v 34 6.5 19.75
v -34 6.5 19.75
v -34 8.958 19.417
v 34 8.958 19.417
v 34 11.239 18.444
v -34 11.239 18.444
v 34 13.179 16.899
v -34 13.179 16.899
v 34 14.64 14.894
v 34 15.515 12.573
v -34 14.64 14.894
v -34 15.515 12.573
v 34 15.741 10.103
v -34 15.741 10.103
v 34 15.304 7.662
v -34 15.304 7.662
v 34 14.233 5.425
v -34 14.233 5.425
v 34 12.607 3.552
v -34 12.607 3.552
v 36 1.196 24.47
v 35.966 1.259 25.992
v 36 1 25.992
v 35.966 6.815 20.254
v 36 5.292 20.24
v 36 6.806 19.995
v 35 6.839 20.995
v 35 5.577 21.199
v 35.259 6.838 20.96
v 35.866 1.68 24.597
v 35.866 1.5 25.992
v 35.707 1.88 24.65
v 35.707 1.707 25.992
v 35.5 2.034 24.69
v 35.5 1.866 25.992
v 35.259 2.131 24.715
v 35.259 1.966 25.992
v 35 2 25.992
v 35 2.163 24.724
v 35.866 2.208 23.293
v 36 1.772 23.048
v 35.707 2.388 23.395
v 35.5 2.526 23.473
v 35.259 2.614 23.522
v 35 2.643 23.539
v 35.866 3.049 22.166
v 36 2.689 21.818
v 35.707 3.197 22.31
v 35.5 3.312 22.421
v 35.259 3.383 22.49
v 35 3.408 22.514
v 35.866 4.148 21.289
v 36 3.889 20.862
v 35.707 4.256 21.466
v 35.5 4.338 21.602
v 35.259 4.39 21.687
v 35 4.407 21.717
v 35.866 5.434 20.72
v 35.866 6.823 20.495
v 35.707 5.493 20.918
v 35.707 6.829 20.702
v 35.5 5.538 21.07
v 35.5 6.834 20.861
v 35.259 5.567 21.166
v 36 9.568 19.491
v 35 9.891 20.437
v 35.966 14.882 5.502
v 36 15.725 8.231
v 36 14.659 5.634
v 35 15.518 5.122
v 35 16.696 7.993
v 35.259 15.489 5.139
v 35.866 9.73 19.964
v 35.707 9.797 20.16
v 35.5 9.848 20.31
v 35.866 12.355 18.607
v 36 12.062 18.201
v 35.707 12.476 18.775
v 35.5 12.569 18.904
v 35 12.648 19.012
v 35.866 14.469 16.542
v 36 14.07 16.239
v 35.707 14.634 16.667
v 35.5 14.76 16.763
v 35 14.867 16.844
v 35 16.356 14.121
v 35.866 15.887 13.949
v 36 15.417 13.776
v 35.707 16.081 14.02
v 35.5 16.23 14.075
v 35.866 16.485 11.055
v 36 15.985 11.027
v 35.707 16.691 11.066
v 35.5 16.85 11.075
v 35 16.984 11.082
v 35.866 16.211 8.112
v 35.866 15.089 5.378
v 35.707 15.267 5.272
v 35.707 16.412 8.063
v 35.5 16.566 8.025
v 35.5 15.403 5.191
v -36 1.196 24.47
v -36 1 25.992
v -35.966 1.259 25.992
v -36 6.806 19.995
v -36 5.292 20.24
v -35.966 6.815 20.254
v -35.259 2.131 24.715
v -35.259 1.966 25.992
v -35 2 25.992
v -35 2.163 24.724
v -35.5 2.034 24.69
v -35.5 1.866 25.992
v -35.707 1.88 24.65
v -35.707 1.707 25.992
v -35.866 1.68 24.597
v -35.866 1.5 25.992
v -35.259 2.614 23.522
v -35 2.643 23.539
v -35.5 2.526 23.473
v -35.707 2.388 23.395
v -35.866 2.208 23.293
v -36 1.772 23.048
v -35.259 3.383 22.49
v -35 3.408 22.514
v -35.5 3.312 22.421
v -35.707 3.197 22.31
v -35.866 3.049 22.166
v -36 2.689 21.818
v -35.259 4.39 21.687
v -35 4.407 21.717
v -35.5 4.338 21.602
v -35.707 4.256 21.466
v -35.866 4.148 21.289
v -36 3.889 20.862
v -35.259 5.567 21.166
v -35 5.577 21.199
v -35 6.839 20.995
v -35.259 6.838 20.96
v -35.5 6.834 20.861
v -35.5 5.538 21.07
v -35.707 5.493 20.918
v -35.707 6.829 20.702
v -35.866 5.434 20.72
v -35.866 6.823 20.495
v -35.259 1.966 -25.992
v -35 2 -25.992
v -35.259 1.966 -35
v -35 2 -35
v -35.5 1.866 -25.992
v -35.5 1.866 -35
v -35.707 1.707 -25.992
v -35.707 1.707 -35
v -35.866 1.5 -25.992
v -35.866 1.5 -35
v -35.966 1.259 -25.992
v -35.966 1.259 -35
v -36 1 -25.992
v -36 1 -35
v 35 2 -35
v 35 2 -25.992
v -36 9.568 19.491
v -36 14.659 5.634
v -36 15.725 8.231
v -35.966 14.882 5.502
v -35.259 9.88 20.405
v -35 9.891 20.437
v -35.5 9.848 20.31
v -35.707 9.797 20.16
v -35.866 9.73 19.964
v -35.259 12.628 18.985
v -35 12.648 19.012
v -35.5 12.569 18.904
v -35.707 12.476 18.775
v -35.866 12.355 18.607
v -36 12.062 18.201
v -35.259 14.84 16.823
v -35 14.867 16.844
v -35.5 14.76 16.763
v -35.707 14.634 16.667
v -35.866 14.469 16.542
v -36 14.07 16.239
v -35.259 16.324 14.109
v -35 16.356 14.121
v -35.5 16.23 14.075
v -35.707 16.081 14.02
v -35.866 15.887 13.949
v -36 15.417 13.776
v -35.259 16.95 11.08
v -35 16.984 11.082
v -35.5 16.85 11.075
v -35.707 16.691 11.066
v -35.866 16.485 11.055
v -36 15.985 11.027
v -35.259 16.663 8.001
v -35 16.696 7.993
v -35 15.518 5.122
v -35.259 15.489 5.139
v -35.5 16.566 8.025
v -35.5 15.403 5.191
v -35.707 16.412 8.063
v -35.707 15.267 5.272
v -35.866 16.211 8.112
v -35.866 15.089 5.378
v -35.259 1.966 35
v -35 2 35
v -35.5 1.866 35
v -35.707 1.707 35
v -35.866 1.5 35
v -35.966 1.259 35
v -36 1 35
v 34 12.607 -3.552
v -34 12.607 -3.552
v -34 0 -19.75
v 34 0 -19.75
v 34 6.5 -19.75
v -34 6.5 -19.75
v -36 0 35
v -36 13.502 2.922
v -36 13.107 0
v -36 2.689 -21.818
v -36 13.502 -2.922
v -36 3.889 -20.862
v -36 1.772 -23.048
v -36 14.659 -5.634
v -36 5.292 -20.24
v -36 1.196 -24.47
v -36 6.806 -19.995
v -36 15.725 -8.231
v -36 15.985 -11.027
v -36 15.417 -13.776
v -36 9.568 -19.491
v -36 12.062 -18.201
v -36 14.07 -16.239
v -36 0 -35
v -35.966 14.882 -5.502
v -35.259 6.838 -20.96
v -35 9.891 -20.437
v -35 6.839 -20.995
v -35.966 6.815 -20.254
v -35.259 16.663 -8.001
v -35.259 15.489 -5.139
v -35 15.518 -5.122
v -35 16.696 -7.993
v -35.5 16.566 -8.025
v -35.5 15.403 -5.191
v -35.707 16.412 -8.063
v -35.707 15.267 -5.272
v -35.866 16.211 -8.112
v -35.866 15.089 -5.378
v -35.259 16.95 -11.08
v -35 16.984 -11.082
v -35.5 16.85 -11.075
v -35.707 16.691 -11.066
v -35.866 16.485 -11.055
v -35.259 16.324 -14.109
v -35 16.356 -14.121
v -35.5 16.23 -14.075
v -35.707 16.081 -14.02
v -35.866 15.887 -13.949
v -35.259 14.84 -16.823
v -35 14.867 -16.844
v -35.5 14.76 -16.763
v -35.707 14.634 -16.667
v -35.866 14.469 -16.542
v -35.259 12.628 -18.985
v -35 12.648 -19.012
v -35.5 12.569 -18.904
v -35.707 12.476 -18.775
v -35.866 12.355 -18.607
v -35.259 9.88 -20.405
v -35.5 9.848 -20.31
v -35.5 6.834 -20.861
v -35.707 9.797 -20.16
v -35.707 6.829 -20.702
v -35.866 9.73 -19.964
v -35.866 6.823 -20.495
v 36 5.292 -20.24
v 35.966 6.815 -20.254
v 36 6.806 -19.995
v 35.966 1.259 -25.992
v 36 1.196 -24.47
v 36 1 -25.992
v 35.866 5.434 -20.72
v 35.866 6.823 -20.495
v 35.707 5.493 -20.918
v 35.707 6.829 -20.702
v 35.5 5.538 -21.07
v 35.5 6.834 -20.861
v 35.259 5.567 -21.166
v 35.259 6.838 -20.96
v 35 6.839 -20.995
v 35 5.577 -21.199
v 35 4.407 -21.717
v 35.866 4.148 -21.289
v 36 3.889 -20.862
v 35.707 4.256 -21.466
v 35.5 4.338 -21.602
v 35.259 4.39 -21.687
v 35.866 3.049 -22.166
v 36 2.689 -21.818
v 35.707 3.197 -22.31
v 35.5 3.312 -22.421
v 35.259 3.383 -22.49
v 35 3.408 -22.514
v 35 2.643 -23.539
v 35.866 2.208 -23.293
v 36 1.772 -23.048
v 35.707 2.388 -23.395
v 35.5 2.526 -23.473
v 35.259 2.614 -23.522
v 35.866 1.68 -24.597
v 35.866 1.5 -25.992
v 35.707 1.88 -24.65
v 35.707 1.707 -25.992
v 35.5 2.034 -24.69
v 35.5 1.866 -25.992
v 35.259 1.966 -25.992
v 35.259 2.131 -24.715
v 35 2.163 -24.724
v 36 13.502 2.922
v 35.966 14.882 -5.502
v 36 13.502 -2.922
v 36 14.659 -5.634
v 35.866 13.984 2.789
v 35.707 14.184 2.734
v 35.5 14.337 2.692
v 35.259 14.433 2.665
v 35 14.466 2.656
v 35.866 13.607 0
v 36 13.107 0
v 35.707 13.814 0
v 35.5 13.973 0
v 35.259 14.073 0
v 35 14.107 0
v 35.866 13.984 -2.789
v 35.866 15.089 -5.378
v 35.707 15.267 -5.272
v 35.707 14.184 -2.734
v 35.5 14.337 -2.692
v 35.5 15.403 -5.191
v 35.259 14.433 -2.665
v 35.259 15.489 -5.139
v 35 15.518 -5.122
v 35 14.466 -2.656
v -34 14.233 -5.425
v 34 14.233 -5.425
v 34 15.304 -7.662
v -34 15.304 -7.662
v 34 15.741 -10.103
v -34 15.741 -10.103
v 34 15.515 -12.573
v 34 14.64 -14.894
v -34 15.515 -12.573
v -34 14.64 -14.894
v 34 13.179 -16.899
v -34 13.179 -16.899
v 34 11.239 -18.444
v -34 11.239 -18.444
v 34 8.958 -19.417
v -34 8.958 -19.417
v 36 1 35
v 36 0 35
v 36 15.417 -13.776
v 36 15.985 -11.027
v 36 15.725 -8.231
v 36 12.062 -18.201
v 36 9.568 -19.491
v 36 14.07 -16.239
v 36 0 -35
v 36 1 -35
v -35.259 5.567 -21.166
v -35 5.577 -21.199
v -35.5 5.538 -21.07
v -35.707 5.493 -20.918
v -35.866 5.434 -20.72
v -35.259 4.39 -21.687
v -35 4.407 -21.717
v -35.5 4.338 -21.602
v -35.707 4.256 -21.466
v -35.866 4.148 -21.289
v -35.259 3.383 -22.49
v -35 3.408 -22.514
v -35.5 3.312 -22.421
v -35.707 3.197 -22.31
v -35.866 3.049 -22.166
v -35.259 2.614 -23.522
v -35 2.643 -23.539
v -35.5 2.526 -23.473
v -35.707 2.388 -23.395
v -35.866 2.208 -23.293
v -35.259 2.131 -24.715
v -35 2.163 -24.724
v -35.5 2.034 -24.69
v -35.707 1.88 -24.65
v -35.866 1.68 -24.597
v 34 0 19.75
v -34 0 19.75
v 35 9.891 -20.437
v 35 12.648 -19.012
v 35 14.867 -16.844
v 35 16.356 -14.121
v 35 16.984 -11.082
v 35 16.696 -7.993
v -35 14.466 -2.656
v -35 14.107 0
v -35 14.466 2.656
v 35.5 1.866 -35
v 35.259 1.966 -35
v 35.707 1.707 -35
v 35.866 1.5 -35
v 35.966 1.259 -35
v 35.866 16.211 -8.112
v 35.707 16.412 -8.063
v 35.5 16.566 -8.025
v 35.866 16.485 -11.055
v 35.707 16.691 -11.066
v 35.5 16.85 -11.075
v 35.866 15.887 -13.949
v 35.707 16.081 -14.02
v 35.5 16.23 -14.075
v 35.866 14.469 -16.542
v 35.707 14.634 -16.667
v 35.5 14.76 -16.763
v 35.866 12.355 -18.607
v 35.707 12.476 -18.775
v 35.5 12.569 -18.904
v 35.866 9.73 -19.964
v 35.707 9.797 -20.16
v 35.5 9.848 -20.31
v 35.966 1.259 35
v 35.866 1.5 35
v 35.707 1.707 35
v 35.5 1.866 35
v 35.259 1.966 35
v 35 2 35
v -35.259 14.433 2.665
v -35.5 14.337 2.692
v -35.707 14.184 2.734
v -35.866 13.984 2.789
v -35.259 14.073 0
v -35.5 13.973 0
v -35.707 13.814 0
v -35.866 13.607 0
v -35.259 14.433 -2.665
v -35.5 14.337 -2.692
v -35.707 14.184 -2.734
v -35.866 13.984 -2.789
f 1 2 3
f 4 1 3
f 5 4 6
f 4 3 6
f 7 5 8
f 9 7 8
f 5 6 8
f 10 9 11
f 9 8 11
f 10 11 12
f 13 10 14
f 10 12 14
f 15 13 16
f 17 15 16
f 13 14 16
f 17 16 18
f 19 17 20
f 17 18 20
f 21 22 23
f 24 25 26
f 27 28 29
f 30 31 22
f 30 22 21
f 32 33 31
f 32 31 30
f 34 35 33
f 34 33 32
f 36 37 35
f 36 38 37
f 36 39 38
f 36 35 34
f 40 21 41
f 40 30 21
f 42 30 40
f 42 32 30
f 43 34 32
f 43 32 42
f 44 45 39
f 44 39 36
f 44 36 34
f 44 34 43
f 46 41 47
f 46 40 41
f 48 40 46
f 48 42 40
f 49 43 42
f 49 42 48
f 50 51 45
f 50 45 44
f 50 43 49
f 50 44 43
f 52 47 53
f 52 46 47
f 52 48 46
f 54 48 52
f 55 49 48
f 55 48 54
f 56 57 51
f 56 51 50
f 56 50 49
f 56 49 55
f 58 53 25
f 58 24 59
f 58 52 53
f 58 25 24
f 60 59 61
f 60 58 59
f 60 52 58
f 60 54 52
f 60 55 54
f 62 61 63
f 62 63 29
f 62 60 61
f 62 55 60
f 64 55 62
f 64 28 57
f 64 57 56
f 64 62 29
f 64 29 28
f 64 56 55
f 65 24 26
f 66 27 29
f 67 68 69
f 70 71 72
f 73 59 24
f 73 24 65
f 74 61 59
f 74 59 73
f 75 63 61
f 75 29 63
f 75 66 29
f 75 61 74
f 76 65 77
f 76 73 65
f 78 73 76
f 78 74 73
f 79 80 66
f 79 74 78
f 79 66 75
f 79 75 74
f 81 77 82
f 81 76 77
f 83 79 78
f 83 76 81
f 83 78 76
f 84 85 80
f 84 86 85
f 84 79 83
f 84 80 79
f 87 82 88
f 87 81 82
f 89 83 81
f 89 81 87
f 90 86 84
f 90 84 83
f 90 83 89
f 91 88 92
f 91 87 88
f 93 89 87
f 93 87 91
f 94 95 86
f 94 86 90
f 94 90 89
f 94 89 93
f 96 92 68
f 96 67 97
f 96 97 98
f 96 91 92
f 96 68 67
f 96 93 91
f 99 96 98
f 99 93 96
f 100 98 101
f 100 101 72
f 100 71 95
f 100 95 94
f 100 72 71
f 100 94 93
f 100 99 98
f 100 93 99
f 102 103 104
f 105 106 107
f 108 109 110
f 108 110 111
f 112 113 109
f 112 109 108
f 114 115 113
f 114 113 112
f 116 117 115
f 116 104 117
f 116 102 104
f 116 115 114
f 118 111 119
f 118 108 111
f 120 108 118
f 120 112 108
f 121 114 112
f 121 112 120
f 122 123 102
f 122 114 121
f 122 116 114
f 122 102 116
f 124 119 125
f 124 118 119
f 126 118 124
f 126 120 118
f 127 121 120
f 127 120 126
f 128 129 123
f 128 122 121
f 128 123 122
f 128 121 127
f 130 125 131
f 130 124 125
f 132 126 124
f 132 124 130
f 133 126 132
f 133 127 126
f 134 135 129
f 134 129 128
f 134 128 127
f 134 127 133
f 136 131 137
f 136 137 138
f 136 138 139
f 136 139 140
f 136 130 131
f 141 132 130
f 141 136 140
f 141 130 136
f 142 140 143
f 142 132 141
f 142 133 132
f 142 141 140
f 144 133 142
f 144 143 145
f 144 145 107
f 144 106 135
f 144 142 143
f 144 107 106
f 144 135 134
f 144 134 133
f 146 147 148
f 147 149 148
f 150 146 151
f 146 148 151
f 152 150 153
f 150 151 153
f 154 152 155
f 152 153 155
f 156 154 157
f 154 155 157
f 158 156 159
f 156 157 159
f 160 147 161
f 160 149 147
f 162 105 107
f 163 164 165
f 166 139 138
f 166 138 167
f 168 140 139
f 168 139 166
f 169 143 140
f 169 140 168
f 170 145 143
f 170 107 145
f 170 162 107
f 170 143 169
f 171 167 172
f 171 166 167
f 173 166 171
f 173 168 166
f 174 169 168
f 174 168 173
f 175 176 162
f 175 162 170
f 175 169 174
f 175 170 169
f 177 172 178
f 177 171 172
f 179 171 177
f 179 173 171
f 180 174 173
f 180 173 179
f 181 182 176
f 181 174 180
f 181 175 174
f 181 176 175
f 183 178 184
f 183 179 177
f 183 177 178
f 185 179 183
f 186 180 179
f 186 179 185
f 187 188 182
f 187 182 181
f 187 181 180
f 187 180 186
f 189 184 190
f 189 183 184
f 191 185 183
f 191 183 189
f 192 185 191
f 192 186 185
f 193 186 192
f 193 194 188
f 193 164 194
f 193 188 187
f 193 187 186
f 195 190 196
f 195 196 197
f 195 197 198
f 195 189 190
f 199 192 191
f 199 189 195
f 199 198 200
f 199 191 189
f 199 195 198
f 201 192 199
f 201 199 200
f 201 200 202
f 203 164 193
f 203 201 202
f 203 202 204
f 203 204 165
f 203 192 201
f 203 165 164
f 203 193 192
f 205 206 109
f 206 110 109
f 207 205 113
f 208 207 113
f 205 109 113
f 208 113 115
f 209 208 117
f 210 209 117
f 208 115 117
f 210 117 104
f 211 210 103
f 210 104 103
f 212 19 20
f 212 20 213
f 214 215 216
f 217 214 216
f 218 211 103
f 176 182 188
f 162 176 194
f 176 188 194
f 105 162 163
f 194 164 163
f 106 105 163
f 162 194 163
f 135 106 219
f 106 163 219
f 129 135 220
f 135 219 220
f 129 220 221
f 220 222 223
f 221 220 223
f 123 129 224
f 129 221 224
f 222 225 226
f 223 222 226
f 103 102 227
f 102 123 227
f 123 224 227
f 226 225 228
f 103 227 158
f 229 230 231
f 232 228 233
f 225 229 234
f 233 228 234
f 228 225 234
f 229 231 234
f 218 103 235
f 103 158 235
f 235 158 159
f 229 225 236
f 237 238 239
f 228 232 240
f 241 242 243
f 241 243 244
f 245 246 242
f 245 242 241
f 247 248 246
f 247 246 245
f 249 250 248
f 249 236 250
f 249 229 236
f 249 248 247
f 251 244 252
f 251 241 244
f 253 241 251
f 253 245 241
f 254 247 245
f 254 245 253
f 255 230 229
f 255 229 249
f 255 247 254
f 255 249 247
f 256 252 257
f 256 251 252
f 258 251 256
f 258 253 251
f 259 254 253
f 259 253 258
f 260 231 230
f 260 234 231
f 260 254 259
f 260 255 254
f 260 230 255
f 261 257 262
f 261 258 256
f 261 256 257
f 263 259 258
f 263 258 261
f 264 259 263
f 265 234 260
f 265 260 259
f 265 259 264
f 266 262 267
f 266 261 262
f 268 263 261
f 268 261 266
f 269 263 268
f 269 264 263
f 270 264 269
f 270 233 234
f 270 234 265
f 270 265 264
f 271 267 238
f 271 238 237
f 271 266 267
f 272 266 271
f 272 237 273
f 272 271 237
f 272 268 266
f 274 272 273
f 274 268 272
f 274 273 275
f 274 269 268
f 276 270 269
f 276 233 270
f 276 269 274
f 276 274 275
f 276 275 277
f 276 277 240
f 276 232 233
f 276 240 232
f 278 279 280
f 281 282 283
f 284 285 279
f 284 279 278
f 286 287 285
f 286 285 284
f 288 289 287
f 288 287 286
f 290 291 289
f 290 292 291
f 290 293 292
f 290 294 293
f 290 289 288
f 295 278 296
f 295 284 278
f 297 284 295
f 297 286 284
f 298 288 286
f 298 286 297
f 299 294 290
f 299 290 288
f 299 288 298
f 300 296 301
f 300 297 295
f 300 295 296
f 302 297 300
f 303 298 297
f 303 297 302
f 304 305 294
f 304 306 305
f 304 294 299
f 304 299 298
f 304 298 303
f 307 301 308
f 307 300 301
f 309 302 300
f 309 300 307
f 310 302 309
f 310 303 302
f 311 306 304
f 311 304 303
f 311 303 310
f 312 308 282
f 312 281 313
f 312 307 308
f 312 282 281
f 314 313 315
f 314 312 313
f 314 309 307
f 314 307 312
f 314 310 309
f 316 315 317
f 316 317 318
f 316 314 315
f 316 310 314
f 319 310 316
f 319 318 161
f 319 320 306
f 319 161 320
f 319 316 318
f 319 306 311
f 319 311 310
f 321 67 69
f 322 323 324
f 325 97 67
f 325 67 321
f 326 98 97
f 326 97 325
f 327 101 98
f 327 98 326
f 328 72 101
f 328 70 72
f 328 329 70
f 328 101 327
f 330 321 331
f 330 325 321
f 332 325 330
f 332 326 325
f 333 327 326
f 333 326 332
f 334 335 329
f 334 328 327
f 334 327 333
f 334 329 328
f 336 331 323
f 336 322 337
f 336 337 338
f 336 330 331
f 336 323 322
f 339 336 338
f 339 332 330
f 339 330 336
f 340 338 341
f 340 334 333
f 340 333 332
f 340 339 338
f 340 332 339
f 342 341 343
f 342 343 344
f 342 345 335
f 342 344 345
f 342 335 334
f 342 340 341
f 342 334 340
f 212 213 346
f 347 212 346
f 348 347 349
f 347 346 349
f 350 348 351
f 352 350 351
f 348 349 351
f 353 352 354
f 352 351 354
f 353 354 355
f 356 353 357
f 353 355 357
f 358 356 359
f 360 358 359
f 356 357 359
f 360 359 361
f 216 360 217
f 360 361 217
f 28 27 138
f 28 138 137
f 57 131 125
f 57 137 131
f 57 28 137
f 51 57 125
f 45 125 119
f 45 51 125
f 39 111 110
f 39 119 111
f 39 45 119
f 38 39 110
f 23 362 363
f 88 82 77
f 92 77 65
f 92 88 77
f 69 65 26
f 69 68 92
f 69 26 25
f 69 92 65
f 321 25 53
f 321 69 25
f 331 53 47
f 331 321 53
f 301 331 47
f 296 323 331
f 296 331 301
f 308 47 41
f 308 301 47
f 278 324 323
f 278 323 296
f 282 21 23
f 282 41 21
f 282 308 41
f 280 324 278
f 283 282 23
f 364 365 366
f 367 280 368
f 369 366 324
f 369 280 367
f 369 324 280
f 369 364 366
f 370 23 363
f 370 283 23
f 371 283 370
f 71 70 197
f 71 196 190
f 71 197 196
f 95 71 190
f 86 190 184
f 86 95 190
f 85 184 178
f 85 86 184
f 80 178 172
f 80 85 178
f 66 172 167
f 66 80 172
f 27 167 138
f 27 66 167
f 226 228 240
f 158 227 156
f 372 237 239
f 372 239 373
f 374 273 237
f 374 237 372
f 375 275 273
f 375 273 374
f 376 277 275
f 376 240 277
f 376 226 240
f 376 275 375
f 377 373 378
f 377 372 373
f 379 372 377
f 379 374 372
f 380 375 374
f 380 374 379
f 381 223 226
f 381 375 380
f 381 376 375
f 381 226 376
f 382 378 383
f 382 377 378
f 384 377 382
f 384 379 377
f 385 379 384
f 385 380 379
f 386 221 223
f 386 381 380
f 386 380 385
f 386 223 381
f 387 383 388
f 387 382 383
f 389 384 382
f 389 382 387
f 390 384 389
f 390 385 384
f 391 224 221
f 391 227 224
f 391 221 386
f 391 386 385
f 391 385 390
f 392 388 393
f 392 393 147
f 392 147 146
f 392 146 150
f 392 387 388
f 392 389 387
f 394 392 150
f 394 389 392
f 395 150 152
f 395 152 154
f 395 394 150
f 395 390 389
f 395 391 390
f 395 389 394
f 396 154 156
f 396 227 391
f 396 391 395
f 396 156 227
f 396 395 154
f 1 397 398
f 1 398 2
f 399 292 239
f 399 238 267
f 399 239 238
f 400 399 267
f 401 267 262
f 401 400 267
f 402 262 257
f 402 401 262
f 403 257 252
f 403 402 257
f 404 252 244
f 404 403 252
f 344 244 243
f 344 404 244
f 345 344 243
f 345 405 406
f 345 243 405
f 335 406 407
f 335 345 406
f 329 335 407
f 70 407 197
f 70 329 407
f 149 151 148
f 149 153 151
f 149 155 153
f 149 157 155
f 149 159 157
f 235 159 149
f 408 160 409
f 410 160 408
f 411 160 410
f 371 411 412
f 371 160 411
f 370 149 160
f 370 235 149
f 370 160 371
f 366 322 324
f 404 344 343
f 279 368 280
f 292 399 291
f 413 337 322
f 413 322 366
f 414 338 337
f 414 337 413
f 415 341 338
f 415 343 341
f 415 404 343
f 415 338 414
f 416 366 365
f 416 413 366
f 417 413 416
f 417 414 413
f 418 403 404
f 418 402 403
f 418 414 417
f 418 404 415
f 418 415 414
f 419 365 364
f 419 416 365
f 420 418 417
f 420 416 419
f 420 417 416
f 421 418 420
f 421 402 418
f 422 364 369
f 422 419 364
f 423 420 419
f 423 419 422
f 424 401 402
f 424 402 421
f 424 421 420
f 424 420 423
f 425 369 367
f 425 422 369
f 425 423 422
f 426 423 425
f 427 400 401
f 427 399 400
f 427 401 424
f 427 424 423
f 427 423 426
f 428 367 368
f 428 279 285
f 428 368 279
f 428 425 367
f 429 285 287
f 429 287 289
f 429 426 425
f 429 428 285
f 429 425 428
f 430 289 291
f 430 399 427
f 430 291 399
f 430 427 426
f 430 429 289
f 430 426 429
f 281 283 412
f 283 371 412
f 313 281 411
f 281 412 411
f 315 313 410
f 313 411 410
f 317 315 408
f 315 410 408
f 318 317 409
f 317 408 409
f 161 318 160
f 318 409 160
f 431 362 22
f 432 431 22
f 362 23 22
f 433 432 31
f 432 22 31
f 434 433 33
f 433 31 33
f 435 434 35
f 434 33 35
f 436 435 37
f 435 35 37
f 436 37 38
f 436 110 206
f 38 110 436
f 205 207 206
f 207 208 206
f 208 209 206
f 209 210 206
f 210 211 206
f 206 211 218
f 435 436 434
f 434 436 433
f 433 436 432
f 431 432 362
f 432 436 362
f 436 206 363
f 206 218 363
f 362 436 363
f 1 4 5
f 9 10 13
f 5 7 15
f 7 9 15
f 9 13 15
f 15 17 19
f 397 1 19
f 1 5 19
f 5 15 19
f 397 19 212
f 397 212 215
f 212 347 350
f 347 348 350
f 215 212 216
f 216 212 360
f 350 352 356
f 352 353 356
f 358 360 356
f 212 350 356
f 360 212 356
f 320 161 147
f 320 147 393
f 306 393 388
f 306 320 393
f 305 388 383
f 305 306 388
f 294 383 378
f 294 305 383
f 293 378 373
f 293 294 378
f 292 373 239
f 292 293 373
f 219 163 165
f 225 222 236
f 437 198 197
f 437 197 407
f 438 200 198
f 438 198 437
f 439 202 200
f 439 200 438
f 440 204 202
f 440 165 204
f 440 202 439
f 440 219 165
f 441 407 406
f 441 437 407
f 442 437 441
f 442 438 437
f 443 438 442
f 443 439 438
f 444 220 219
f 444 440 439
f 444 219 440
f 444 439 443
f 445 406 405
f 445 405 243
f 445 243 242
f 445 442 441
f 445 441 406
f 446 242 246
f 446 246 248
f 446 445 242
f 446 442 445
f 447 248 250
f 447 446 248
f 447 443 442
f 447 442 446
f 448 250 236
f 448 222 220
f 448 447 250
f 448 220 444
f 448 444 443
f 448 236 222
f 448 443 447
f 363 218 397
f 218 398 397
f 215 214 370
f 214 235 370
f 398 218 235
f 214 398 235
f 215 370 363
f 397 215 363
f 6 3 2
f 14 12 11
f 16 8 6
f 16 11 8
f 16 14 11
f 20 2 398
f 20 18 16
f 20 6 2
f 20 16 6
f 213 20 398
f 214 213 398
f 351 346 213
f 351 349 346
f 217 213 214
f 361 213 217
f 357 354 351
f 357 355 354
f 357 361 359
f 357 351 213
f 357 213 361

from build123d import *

# Parameters (mm, degrees)
SKETCH1_W                = 72
SKETCH1_H                = 70
BOSS_EXTRUDE1_DEPTH      = 2
BOSS_EXTRUDE2_DEPTH      = 34
BOSS_EXTRUDE2_DEPTH_BACK = 34
CUT_EXTRUDE1_START       = -34
SKETCH3_W                = 39.5
SKETCH3_H                = 2
CUT_EXTRUDE1_DEPTH       = 68
BOSS_EXTRUDE3_DEPTH      = 2
FILLET2_R                = 1
FILLET2_OF_MIRROR1_R     = 1


with BuildPart() as part:
    # Sketch1 → Boss-Extrude1 (new body)
    with BuildSketch(Plane(origin=(0, 0, 0), x_dir=(1, 0, 0), z_dir=(0, 1, 0))):
        Rectangle(SKETCH1_W, SKETCH1_H)
    extrude(amount=BOSS_EXTRUDE1_DEPTH)

    # Sketch2 → Boss-Extrude2 (add, two sides: drawn at the far end of the back side and taken through both)
    with BuildSketch(Plane(origin=(0, 0, 0), x_dir=(0, 0, -1), z_dir=(1, 0, 0)).offset(-BOSS_EXTRUDE2_DEPTH_BACK)):
        with BuildLine():
            Line((-25.991933385, 2), (-19.75, 2))
            Line((-19.75, 2), (-19.75, 6.5))
            ThreePointArc((-19.75, 6.5), (-13.763212024, 15.155284356), (-3.552389776, 12.606816862))
            Line((-3.552389776, 12.606816862), (3.552389776, 12.606816862))
            ThreePointArc((3.552389776, 12.606816862), (13.763212024, 15.155284356), (19.75, 6.5))
            Line((19.75, 6.5), (19.75, 2))
            Line((19.75, 2), (25.991933385, 2))
            ThreePointArc((25.991933385, 2), (22.513891667, 3.407893959), (20.994535519, 6.838709677))
            ThreePointArc((20.994535519, 6.838709677), (15.537625909, 15.712617717), (5.12195122, 15.51812571))
            ThreePointArc((5.12195122, 15.51812571), (0, 14.106816862), (-5.12195122, 15.51812571))
            ThreePointArc((-5.12195122, 15.51812571), (-15.537625909, 15.712617717), (-20.994535519, 6.838709677))
            ThreePointArc((-20.994535519, 6.838709677), (-22.513891667, 3.407893959), (-25.991933385, 2))
        make_face()
    extrude(amount=BOSS_EXTRUDE2_DEPTH + BOSS_EXTRUDE2_DEPTH_BACK)

    # Sketch3 → Cut-Extrude1 (cut)
    with BuildSketch(Plane(origin=(0, 0, 0), x_dir=(0, 0, -1), z_dir=(1, 0, 0)).offset(CUT_EXTRUDE1_START)):
        with Locations((0, 1)):
            Rectangle(SKETCH3_W, SKETCH3_H)
    extrude(amount=CUT_EXTRUDE1_DEPTH, mode=Mode.SUBTRACT)

    # Sketch4 → Boss-Extrude3 (add)
    with BuildSketch(Plane(origin=(34, 0, 0), x_dir=(0, 0, -1), z_dir=(1, 0, 0))):
        with BuildLine():
            Line((-25.991933385, 2), (25.991933385, 2))
            ThreePointArc((25.991933385, 2), (22.513891667, 3.407893959), (20.994535519, 6.838709677))
            ThreePointArc((20.994535519, 6.838709677), (15.537625909, 15.712617717), (5.12195122, 15.51812571))
            ThreePointArc((5.12195122, 15.51812571), (0, 14.106816862), (-5.12195122, 15.51812571))
            ThreePointArc((-5.12195122, 15.51812571), (-15.537625909, 15.712617717), (-20.994535519, 6.838709677))
            ThreePointArc((-20.994535519, 6.838709677), (-22.513891667, 3.407893959), (-25.991933385, 2))
        make_face()
    boss_extrude3 = extrude(amount=BOSS_EXTRUDE3_DEPTH)

    # Fillet2
    fillet2_edges = [part.edges().sort_by_distance(p)[0] for p in [
        (36, 2, 30.495966692),
        (36, 2, -30.495966692),
        (36, 3.407893959, -22.513891667),
        (36, 15.712617717, -15.537625909),
        (36, 14.106816862, 0),
        (36, 15.712617717, 15.537625909),
        (36, 3.407893959, 22.513891667),
    ]]
    fillet(fillet2_edges, radius=FILLET2_R)

    # Mirror1: Boss-Extrude3 across plane
    add(boss_extrude3.mirror(Plane(origin=(0, 0, 0), x_dir=(0, 0, 1), z_dir=(1, 0, 0))))

    # Fillet2 of Mirror1
    fillet2_of_mirror1_edges = [part.edges().sort_by_distance(p)[0] for p in [
        (-36, 2, 30.495966692),
        (-36, 2, -30.495966692),
        (-36, 3.407893959, -22.513891667),
        (-36, 15.712617717, -15.537625909),
        (-36, 14.106816862, 0),
        (-36, 15.712617717, 15.537625909),
        (-36, 3.407893959, 22.513891667),
    ]]
    fillet(fillet2_of_mirror1_edges, radius=FILLET2_OF_MIRROR1_R)


solid = part.part
